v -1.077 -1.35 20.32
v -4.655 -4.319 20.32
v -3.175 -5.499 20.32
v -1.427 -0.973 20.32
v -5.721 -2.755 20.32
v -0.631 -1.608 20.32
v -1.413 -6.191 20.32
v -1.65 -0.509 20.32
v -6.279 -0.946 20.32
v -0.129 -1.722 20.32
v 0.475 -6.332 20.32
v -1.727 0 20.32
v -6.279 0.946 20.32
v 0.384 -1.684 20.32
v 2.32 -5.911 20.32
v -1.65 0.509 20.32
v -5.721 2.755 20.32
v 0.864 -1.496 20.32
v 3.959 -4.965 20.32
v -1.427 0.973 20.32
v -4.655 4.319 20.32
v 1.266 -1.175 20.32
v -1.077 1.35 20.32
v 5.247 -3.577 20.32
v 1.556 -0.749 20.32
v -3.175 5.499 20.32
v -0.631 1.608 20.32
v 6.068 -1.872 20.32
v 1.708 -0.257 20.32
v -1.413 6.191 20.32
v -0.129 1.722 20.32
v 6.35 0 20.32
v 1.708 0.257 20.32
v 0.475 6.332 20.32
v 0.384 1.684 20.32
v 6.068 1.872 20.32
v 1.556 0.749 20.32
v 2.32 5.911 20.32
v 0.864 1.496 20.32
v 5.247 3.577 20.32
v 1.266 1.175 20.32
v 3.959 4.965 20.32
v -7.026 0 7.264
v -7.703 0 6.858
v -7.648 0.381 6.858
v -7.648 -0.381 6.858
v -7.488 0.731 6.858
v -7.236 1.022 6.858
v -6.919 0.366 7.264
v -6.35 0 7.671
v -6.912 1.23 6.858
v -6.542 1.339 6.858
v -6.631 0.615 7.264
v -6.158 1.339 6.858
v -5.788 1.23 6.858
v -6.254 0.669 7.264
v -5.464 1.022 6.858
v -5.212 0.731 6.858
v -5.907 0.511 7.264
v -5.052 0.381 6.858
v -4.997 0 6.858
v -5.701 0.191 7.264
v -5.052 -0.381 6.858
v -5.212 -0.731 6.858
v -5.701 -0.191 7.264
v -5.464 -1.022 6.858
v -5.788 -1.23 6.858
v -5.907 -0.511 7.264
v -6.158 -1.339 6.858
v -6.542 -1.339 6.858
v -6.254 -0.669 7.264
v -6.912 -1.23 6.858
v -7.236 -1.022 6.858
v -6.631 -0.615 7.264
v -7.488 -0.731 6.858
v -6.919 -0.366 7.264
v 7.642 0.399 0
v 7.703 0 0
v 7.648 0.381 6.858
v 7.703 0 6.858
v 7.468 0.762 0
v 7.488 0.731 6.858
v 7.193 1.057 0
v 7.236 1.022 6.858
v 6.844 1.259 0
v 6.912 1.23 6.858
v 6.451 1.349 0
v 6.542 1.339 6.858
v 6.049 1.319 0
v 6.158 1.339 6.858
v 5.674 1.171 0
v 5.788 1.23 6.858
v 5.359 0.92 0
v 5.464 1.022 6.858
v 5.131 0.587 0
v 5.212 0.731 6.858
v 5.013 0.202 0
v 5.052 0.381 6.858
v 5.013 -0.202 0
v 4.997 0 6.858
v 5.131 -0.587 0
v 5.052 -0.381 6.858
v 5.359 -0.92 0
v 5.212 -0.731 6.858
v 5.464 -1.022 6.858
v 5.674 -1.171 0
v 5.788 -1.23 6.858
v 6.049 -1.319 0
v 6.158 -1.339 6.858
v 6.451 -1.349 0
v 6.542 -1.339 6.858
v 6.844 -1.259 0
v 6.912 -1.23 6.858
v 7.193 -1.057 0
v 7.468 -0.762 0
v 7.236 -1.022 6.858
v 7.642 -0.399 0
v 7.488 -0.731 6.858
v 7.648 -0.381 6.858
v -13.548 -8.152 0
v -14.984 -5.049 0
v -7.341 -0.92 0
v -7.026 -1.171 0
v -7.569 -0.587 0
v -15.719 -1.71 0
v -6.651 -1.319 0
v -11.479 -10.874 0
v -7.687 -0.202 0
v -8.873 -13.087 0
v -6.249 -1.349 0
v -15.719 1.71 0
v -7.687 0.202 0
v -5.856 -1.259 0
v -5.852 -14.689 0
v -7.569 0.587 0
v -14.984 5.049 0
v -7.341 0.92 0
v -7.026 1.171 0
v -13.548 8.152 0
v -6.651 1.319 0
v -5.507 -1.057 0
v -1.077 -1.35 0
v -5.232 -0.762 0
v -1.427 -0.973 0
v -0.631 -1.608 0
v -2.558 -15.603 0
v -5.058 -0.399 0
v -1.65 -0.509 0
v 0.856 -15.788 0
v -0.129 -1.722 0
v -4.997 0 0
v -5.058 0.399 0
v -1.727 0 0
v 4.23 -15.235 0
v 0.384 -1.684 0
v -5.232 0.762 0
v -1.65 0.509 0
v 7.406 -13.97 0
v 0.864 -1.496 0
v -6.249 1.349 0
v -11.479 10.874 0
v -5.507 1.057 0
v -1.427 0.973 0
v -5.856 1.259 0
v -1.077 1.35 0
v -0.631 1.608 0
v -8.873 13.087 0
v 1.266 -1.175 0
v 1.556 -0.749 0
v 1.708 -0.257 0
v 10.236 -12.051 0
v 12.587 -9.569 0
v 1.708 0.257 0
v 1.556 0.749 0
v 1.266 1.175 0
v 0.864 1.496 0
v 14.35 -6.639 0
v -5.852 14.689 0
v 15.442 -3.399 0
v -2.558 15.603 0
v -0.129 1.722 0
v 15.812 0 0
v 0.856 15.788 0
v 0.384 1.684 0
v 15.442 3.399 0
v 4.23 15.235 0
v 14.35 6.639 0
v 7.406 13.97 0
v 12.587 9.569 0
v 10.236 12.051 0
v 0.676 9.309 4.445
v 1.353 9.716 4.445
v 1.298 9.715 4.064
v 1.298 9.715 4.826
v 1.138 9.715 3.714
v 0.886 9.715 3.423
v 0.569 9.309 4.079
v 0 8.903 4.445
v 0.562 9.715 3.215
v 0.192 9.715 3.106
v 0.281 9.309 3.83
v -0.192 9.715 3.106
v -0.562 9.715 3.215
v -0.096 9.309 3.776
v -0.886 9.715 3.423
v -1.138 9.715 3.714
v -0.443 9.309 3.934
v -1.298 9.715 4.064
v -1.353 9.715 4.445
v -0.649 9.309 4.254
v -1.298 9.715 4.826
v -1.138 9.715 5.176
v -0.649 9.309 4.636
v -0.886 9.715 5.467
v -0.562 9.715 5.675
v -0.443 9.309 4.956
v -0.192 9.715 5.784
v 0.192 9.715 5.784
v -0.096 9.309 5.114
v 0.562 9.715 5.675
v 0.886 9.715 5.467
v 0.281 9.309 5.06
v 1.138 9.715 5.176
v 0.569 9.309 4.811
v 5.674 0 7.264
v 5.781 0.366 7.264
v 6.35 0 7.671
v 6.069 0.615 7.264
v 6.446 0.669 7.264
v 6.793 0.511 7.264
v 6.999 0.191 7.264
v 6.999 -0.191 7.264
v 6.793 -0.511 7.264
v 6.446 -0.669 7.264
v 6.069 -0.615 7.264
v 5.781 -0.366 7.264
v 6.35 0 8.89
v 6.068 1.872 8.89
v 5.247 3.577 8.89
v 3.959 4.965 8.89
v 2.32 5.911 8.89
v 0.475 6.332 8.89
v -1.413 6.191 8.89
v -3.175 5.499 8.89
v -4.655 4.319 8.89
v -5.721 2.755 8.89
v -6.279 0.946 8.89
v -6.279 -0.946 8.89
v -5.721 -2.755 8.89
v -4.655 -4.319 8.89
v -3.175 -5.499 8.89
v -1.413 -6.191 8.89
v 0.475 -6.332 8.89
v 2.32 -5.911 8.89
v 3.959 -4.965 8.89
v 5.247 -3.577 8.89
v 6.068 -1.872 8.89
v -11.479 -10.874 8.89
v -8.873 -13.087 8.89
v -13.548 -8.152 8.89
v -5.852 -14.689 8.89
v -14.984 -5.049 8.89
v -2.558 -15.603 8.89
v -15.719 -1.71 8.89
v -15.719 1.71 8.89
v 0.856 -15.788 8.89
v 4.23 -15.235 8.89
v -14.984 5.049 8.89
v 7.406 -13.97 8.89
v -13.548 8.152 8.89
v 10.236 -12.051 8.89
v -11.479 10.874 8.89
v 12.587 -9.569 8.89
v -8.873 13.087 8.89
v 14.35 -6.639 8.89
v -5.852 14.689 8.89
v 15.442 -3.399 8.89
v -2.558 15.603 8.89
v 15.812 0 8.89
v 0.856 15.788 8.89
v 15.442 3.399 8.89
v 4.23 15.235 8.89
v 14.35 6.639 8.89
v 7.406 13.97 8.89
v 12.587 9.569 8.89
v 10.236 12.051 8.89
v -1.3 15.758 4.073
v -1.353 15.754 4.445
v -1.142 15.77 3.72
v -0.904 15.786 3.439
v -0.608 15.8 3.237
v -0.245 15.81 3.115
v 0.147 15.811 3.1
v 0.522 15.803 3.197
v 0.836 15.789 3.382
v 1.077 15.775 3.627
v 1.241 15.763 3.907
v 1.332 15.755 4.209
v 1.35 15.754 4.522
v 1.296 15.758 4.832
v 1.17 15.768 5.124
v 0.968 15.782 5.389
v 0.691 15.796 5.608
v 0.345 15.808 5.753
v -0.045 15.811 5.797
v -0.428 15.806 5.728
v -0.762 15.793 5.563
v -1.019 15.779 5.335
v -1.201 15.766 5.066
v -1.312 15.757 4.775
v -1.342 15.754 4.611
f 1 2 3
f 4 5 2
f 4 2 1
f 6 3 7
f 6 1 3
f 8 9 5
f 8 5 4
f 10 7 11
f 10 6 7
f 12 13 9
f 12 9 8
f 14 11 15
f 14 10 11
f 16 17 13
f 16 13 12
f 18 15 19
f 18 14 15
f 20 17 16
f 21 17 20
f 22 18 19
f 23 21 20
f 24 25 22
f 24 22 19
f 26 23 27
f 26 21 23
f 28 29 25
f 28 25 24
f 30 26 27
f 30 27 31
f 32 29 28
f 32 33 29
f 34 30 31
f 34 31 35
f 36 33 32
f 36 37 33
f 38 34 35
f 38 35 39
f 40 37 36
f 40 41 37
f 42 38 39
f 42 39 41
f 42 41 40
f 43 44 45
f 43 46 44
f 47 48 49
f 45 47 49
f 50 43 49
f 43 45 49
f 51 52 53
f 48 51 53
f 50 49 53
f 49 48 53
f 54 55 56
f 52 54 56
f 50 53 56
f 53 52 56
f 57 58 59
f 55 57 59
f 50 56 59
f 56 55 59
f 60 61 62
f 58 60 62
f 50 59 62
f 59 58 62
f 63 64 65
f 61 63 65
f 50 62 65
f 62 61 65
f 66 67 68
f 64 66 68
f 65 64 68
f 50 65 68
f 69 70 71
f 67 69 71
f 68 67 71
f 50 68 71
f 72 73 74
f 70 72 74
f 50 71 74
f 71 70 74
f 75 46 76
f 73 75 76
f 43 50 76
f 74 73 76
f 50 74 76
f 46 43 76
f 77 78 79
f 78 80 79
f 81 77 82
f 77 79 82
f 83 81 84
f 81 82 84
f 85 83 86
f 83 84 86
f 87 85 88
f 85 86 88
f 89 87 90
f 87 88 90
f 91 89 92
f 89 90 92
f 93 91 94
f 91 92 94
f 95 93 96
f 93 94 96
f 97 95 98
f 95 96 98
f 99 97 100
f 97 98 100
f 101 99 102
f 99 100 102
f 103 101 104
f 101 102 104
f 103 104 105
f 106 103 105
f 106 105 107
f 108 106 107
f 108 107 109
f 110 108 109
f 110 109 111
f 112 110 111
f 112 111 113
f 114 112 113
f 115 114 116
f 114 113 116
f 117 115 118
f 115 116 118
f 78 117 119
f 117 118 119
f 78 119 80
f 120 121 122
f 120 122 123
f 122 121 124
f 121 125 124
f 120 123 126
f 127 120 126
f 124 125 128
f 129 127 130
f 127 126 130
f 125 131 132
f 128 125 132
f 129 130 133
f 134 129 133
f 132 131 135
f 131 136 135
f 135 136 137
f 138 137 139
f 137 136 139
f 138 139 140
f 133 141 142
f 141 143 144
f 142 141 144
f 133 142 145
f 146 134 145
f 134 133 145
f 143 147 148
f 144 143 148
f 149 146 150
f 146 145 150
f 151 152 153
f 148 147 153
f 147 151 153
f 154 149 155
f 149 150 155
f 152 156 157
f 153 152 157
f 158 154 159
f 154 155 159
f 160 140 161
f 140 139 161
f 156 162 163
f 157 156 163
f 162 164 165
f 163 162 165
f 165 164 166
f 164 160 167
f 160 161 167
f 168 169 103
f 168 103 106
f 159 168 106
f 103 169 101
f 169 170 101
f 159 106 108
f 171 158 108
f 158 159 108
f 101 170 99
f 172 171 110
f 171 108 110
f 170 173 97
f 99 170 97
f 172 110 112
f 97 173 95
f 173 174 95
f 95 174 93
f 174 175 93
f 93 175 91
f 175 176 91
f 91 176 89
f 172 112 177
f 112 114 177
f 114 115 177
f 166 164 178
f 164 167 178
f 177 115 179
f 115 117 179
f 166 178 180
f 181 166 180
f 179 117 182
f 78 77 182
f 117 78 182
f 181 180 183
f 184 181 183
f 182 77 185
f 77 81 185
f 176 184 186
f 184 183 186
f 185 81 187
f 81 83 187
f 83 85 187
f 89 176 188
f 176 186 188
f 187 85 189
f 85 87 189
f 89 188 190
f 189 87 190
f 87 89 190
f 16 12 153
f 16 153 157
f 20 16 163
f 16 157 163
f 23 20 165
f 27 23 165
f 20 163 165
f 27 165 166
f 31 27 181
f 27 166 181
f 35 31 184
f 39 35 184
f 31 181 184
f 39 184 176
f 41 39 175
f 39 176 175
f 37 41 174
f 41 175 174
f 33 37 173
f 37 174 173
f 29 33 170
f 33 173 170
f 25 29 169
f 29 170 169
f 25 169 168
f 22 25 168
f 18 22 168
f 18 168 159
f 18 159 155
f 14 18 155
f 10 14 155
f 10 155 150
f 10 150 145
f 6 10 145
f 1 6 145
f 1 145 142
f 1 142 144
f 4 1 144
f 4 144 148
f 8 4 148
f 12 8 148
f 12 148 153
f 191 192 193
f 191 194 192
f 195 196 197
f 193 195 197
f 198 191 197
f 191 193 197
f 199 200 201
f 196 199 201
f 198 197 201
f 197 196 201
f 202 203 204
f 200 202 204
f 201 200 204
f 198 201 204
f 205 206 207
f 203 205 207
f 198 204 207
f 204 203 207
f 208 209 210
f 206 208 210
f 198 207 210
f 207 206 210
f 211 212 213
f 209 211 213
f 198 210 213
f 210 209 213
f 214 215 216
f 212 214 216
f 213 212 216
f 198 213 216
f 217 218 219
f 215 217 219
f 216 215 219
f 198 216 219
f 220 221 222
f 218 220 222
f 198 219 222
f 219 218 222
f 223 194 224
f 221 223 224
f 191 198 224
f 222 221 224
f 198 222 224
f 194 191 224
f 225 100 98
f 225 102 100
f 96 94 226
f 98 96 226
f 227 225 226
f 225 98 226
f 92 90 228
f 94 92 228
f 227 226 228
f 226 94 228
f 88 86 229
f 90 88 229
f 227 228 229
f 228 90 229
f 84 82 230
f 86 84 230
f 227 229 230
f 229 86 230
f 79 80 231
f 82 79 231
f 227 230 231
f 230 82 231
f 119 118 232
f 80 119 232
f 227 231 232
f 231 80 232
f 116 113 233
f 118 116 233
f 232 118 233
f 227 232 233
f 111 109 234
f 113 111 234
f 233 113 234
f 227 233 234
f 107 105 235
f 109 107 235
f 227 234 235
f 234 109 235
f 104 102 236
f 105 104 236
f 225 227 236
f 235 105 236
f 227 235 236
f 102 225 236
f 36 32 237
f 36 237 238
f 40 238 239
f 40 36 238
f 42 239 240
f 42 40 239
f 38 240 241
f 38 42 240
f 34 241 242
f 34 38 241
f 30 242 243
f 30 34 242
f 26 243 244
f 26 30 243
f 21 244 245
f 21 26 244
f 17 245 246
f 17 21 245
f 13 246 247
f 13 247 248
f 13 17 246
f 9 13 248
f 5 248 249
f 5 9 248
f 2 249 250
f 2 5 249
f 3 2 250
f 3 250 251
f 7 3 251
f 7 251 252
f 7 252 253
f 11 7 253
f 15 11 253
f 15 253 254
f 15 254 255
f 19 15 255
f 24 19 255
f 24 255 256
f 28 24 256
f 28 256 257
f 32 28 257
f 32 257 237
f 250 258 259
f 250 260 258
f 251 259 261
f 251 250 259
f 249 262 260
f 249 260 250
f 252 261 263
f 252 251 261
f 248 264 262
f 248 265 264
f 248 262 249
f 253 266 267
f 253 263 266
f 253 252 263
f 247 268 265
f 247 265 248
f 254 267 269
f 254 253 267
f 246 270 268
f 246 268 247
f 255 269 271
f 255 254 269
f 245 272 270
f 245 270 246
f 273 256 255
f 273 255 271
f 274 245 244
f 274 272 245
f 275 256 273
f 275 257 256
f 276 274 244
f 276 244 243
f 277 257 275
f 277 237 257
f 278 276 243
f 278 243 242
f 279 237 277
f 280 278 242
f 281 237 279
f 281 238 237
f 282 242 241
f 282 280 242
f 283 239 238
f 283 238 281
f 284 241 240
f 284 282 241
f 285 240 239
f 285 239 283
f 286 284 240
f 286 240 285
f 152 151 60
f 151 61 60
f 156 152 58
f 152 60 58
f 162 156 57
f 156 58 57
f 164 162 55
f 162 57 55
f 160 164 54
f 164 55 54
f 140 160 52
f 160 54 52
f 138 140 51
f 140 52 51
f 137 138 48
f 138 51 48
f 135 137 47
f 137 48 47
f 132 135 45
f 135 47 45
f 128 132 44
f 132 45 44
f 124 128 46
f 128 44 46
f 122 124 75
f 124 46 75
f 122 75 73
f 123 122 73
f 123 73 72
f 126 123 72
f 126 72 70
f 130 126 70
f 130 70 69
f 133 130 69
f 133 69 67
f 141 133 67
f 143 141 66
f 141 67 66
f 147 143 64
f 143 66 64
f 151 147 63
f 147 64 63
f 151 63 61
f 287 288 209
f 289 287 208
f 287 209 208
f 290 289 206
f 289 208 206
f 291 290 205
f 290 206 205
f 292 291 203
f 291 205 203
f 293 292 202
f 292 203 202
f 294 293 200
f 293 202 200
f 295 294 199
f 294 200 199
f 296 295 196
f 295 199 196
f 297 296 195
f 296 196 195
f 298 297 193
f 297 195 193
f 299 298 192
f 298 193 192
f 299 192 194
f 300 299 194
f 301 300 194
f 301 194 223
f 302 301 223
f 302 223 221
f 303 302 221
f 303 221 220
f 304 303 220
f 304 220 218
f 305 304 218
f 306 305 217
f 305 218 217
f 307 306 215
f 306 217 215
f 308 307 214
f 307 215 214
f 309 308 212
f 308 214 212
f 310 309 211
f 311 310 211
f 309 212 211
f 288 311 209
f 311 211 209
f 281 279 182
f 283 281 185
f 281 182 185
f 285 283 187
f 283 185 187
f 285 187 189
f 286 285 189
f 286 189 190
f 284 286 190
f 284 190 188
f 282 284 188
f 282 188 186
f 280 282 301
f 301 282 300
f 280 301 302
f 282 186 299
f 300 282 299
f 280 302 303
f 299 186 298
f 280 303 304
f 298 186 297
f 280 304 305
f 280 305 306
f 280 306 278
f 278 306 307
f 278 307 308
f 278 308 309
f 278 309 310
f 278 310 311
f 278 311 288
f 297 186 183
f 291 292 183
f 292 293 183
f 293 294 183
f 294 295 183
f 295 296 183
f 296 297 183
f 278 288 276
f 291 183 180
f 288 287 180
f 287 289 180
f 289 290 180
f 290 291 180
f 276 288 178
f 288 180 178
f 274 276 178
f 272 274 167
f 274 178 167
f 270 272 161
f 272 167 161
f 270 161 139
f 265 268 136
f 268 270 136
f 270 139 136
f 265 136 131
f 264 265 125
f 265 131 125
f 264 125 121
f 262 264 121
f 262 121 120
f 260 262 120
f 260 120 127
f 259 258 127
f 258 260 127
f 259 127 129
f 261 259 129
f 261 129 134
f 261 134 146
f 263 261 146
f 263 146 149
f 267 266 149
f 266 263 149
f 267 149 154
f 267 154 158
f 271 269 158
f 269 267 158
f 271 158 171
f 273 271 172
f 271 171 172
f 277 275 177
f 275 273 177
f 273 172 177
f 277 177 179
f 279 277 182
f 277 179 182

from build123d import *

# Parameters (mm, degrees)
SKETCH1_R                 = 15.8115
BOSS_EXTRUDE1_DEPTH       = 25.4
SKETCH2_OUTSIDE_W         = 43.91
SKETCH2_OUTSIDE_H         = 43.91
SKETCH2_OUTSIDE_R         = 6.35
CUT_EXTRUDE1_DEPTH        = 16.51
F_8_32_TAPPED_HOLE1_D     = 3.4544
F_6_32_TAPPED_HOLE2_D     = 2.7051
F_6_32_TAPPED_HOLE2_DEPTH = 6.858
F_6_32_TAPPED_HOLE2_TIP   = 0.81269403
F_6_32_TAPPED_HOLE3_D     = 2.7051
F_6_32_TAPPED_HOLE3_DEPTH = 6.096
F_6_32_TAPPED_HOLE3_TIP   = 0.81269403
SKETCH9_R                 = 6.35
CUT_EXTRUDE3_DEPTH        = 5.08


with BuildPart() as part:
    # Sketch1 → Boss-Extrude1 (new body)
    with BuildSketch(Plane.XY):
        Circle(SKETCH1_R)
    extrude(amount=BOSS_EXTRUDE1_DEPTH)

    # Sketch2 outside → Cut-Extrude1 (cut)
    with BuildSketch(Plane.XY.offset(25.4)):
        Rectangle(SKETCH2_OUTSIDE_W, SKETCH2_OUTSIDE_H)
        Circle(SKETCH2_OUTSIDE_R, mode=Mode.SUBTRACT)
    extrude(amount=-CUT_EXTRUDE1_DEPTH, mode=Mode.SUBTRACT)

    # #8-32 Tapped Hole1 (through all)
    with Locations(Plane.XY.offset(25.4)):
        with Locations((0, 0)):
            Hole(F_8_32_TAPPED_HOLE1_D / 2)

    # #6-32 Tapped Hole2
    with Locations(Plane(origin=(0, 0, 0), x_dir=(-1, 0, 0), z_dir=(0, 0, -1))):
        with Locations((-6.35, 0), (6.35, 0)):
            Hole(F_6_32_TAPPED_HOLE2_D / 2, depth=F_6_32_TAPPED_HOLE2_DEPTH)
            with Locations((0, 0, -(F_6_32_TAPPED_HOLE2_DEPTH + F_6_32_TAPPED_HOLE2_TIP / 2))):  # 118° drill point
                Cone(0, F_6_32_TAPPED_HOLE2_D / 2, F_6_32_TAPPED_HOLE2_TIP, mode=Mode.SUBTRACT)

    # #6-32 Tapped Hole3
    with Locations(Plane(origin=(0, 15.8115, 4.445), x_dir=(1, 0, 0), z_dir=(0, 1, 0))):
        with Locations((0, 0)):
            Hole(F_6_32_TAPPED_HOLE3_D / 2, depth=F_6_32_TAPPED_HOLE3_DEPTH)
            with Locations((0, 0, -(F_6_32_TAPPED_HOLE3_DEPTH + F_6_32_TAPPED_HOLE3_TIP / 2))):  # 118° drill point
                Cone(0, F_6_32_TAPPED_HOLE3_D / 2, F_6_32_TAPPED_HOLE3_TIP, mode=Mode.SUBTRACT)

    # Sketch9 → Cut-Extrude3 (cut)
    with BuildSketch(Plane.XY.offset(25.4)):
        Circle(SKETCH9_R)
    extrude(amount=-CUT_EXTRUDE3_DEPTH, mode=Mode.SUBTRACT)


solid = part.part
